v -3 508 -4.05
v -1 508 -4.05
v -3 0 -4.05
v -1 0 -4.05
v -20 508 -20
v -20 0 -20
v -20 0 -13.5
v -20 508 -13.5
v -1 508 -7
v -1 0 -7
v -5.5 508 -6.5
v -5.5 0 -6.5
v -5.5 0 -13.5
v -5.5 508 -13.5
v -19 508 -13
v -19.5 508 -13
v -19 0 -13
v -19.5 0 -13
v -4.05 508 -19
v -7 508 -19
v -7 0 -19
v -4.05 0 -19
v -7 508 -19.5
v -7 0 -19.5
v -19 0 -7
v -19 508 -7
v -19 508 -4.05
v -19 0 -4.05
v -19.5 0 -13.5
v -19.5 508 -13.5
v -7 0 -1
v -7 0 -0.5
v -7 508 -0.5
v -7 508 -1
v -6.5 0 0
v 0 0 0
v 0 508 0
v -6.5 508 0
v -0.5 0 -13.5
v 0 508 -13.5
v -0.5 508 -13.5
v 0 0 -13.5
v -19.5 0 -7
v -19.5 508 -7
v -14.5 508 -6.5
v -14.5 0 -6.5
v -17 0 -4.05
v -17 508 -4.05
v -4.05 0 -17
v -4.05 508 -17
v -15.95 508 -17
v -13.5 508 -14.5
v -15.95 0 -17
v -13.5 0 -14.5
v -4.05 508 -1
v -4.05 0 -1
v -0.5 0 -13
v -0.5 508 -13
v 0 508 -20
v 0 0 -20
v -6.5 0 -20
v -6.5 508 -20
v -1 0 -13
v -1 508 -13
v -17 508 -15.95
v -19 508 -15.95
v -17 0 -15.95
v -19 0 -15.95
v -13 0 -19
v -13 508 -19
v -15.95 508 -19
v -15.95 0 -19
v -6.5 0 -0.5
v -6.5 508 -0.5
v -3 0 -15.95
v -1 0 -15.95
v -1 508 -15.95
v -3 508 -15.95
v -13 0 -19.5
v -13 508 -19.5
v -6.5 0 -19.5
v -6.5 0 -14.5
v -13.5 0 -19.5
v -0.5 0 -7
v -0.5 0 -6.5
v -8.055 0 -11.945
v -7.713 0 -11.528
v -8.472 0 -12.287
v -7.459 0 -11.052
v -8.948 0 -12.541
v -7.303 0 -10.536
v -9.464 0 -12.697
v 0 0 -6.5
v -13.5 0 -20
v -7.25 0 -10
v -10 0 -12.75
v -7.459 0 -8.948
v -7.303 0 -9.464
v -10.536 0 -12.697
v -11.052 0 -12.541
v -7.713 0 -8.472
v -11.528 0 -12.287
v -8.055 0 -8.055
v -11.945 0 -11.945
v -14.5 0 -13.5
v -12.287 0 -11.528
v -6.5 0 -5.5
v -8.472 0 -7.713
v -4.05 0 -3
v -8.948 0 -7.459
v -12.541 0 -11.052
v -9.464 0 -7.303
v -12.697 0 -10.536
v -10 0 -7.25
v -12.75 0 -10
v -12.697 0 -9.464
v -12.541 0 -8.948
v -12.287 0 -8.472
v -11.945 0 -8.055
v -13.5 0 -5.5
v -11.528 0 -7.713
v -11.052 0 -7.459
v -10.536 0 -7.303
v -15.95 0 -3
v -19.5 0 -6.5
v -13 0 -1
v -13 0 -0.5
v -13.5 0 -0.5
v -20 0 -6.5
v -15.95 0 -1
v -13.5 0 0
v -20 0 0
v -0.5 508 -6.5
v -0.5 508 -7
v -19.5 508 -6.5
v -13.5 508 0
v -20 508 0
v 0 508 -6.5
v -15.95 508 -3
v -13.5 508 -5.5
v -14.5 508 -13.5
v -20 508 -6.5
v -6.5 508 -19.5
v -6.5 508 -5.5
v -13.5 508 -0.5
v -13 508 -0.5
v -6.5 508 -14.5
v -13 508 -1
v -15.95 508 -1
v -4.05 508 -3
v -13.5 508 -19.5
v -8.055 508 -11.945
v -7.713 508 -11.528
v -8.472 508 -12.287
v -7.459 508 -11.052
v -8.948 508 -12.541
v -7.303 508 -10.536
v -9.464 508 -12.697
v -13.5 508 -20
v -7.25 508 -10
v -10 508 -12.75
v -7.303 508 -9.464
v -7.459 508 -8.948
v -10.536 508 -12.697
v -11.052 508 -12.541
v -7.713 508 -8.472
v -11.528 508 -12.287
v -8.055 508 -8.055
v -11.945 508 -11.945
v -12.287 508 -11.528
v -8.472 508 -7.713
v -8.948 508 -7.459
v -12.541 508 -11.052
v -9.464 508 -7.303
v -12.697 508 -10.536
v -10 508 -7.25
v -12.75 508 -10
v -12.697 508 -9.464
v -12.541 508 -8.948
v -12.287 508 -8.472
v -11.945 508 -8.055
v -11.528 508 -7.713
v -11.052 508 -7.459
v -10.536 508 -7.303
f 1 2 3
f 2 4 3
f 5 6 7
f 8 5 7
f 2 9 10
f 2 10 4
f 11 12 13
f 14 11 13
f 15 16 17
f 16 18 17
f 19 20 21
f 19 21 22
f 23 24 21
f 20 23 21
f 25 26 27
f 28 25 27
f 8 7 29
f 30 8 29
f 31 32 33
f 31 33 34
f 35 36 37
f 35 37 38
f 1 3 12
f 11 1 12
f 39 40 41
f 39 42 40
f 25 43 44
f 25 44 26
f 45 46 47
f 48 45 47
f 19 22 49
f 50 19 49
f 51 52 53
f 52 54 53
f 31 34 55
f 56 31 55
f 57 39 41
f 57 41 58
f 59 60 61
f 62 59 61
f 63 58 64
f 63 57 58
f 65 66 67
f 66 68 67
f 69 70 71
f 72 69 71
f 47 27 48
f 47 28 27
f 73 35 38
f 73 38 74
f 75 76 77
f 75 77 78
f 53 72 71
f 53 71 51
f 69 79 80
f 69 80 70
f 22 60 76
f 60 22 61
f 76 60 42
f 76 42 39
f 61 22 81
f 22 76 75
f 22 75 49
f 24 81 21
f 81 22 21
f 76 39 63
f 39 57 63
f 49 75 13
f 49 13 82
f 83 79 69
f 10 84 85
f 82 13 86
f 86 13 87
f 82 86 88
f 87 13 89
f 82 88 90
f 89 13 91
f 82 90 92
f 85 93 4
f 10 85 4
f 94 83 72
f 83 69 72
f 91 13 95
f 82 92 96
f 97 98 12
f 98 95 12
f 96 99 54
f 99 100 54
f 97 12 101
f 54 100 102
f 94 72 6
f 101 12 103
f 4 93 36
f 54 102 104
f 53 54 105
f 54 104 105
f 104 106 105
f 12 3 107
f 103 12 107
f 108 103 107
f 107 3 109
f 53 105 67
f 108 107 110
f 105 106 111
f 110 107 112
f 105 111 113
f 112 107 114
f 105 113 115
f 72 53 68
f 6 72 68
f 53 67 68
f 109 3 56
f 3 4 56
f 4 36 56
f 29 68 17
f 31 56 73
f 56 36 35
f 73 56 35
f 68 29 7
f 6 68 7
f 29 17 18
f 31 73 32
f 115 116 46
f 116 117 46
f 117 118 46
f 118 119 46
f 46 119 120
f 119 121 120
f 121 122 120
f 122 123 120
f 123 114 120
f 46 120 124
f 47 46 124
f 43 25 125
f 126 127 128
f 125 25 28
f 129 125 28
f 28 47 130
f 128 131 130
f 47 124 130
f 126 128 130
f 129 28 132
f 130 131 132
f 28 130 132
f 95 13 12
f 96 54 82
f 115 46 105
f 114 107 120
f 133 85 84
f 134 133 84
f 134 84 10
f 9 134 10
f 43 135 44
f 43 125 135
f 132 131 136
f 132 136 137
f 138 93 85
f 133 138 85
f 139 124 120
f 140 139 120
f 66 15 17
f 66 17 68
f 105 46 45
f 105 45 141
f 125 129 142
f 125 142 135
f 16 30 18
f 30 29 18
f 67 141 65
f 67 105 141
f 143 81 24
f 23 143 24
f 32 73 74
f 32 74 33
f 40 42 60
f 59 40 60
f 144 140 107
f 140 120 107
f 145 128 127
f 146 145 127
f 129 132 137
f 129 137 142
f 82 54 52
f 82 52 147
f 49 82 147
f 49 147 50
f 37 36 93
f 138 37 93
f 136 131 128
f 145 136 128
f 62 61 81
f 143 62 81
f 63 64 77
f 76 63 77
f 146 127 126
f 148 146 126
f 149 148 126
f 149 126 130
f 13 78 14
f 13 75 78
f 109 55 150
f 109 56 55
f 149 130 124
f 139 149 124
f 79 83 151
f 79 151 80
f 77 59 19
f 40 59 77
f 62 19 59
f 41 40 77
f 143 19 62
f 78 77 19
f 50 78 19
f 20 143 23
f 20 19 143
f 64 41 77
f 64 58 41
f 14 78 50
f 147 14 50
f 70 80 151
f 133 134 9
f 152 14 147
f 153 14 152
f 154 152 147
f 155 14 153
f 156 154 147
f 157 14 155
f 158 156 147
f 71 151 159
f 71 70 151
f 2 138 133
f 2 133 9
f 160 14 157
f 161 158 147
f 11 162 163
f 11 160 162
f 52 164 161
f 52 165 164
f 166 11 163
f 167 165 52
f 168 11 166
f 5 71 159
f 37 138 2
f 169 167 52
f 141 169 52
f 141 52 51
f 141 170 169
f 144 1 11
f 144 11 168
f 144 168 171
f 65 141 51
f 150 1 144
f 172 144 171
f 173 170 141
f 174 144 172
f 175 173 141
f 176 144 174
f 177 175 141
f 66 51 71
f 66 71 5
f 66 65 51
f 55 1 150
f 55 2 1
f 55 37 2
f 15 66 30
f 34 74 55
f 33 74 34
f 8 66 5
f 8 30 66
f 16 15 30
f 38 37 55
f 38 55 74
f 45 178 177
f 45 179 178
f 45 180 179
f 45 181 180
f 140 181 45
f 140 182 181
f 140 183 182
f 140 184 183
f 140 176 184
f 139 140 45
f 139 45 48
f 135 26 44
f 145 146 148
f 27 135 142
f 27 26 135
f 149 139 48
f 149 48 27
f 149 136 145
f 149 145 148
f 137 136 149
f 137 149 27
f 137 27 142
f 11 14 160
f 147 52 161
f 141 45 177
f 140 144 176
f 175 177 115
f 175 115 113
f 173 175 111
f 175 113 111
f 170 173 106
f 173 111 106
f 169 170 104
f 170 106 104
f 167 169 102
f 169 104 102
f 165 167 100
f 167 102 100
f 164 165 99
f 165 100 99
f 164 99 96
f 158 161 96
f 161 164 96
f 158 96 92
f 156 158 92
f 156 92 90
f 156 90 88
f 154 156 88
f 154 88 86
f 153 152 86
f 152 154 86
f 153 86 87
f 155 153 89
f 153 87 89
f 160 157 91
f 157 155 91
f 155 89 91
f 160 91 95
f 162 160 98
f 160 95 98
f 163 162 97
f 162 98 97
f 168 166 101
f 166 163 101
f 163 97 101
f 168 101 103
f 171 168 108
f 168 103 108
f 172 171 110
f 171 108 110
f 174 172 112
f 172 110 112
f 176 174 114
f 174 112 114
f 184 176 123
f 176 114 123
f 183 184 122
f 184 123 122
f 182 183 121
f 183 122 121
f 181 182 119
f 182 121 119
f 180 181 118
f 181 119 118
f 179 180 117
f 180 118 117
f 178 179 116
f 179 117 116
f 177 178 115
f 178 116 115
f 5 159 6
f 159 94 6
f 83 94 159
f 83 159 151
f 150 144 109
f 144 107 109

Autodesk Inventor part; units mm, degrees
ref_plane "YZ Plane" through (0, 0, 0) normal (1, 0, 0) x (0, 1, 0)
ref_plane "XZ Plane" through (0, 0, 0) normal (0, 1, 0) x (-1, 0, 0)
ref_plane "XY Plane" through (0, 0, 0) normal (0, 0, 1) x (1, 0, 0)
sketch "Sketch1" plane through (0, 0, 0) normal (0, 1, 0) x (-1, 0, 0)
  line L0 (0, 0) -> (0, -6.5)
  line L1 (0, -6.5) -> (0.5, -6.5)
  line L2 (0.5, -6.5) -> (0.5, -7)
  line L3 (0.5, -7) -> (1, -7)
  line L4 (1, -7) -> (1, -4.05)
  line L5 (1, -4.05) -> (3, -4.05)
  line L6 (5.5, -6.5) -> (5.5, -13.5)
  line L7 (0, -13.5) -> (0.5, -13.5)
  line L8 (0.5, -13.5) -> (0.5, -13)
  line L9 (0.5, -13) -> (1, -13)
  line L10 (1, -13) -> (1, -15.95)
  line L11 (1, -15.95) -> (3, -15.95)
  line L12 (3, -15.95) -> (5.5, -13.5)
  line L13 (3, -4.05) -> (5.5, -6.5)
  line L14 (0, -13.5) -> (0, -20)
  line L15 (0, -20) -> (6.5, -20)
  line L16 (6.5, -20) -> (6.5, -19.5)
  line L17 (6.5, -19.5) -> (7, -19.5)
  line L18 (7, -19.5) -> (7, -19)
  line L19 (7, -19) -> (4.05, -19)
  line L20 (4.05, -19) -> (4.05, -17)
  line L21 (0, 0) -> (6.5, 0)
  line L22 (6.5, 0) -> (6.5, -0.5)
  line L23 (6.5, -0.5) -> (7, -0.5)
  line L24 (7, -0.5) -> (7, -1)
  line L25 (7, -1) -> (4.05, -1)
  line L26 (4.05, -1) -> (4.05, -3)
  line L27 (13.5, -20) -> (13.5, -19.5)
  line L28 (13.5, -19.5) -> (13, -19.5)
  line L29 (13, -19.5) -> (13, -19)
  line L30 (13, -19) -> (15.95, -19)
  line L31 (15.95, -19) -> (15.95, -17)
  line L32 (13.5, -14.5) -> (6.5, -14.5)
  line L33 (6.5, -14.5) -> (4.05, -17)
  line L34 (13.5, -14.5) -> (15.95, -17)
  line L35 (13.5, -20) -> (20, -20)
  line L36 (20, -20) -> (20, -13.5)
  line L37 (20, -13.5) -> (19.5, -13.5)
  line L38 (19.5, -13.5) -> (19.5, -13)
  line L39 (19.5, -13) -> (19, -13)
  line L40 (19, -13) -> (19, -15.95)
  line L41 (19, -15.95) -> (17, -15.95)
  line L42 (13.5, 0) -> (13.5, -0.5)
  line L43 (13.5, -0.5) -> (13, -0.5)
  line L44 (13, -0.5) -> (13, -1)
  line L45 (13, -1) -> (15.95, -1)
  line L46 (15.95, -1) -> (15.95, -3)
  line L47 (13.5, 0) -> (20, 0)
  line L48 (20, 0) -> (20, -6.5)
  line L49 (20, -6.5) -> (19.5, -6.5)
  line L50 (19.5, -6.5) -> (19.5, -7)
  line L51 (19.5, -7) -> (19, -7)
  line L52 (19, -7) -> (19, -4.05)
  line L53 (19, -4.05) -> (17, -4.05)
  line L54 (13.5, -5.5) -> (6.5, -5.5)
  line L55 (15.95, -3) -> (13.5, -5.5)
  line L56 (6.5, -5.5) -> (4.05, -3)
  line L57 (14.5, -6.5) -> (14.5, -13.5)
  line L58 (14.5, -13.5) -> (17, -15.95)
  line L59 (14.5, -6.5) -> (17, -4.05)
  circle A0 centre (10, -10) radius 2.75
  dimension "d0" = 6.5
  dimension "d1" = 0.5
  dimension "d2" = 0.5
  dimension "d3" = 0.5
  dimension "d4" = 2.95
  dimension "d5" = 2
  dimension "d6" = 7
  dimension "d7" = 0.5
  dimension "d8" = 2.95
  dimension "d9" = 2
  dimension "d10" = 6.5
  dimension "d11" = 6.5
  dimension "d12" = 0.5
  dimension "d13" = 0.5
  dimension "d14" = 0.5
  dimension "d15" = 2.95
  dimension "d16" = 2
  dimension "d17" = 5.5
  dimension "d18" = 6.5
  dimension "d19" = 0.5
  dimension "d20" = 0.5
  dimension "d21" = 0.5
  dimension "d22" = 2.95
  dimension "d23" = 2
  dimension "d24" = 5.5
  dimension "d25" = 0.5
  dimension "d26" = 0.5
  dimension "d27" = 0.5
  dimension "d28" = 0.5
  dimension "d29" = 2.95
  dimension "d30" = 2
  dimension "d31" = 7
  dimension "d32" = 6.5
  dimension "d33" = 6.5
  dimension "d34" = 0.5
  dimension "d35" = 0.5
  dimension "d36" = 0.5
  dimension "d37" = 2.95
  dimension "d38" = 2
  dimension "d39" = 5.5
  dimension "d40" = 5.5
  dimension "d41" = 0.5
  dimension "d42" = 0.5
  dimension "d43" = 0.5
  dimension "d44" = 2.95
  dimension "d45" = 2
  dimension "d46" = 6.5
  dimension "d47" = 6.5
  dimension "d48" = 0.5
  dimension "d49" = 0.5
  dimension "d50" = 0.5
  dimension "d51" = 2.95
  dimension "d52" = 2
  dimension "d53" = 7
  dimension "d54" = 5.5
  dimension "d55" = 5.5
  dimension "d56" = 5.5
  dimension "d57" = 5.5
  dimension "d58" = 10
  dimension "d59" = 10
extrude "Extrusion1" add sketch "Sketch1" along normal blind 508
properties part number "Tslot_2020extrusion_20inch"
